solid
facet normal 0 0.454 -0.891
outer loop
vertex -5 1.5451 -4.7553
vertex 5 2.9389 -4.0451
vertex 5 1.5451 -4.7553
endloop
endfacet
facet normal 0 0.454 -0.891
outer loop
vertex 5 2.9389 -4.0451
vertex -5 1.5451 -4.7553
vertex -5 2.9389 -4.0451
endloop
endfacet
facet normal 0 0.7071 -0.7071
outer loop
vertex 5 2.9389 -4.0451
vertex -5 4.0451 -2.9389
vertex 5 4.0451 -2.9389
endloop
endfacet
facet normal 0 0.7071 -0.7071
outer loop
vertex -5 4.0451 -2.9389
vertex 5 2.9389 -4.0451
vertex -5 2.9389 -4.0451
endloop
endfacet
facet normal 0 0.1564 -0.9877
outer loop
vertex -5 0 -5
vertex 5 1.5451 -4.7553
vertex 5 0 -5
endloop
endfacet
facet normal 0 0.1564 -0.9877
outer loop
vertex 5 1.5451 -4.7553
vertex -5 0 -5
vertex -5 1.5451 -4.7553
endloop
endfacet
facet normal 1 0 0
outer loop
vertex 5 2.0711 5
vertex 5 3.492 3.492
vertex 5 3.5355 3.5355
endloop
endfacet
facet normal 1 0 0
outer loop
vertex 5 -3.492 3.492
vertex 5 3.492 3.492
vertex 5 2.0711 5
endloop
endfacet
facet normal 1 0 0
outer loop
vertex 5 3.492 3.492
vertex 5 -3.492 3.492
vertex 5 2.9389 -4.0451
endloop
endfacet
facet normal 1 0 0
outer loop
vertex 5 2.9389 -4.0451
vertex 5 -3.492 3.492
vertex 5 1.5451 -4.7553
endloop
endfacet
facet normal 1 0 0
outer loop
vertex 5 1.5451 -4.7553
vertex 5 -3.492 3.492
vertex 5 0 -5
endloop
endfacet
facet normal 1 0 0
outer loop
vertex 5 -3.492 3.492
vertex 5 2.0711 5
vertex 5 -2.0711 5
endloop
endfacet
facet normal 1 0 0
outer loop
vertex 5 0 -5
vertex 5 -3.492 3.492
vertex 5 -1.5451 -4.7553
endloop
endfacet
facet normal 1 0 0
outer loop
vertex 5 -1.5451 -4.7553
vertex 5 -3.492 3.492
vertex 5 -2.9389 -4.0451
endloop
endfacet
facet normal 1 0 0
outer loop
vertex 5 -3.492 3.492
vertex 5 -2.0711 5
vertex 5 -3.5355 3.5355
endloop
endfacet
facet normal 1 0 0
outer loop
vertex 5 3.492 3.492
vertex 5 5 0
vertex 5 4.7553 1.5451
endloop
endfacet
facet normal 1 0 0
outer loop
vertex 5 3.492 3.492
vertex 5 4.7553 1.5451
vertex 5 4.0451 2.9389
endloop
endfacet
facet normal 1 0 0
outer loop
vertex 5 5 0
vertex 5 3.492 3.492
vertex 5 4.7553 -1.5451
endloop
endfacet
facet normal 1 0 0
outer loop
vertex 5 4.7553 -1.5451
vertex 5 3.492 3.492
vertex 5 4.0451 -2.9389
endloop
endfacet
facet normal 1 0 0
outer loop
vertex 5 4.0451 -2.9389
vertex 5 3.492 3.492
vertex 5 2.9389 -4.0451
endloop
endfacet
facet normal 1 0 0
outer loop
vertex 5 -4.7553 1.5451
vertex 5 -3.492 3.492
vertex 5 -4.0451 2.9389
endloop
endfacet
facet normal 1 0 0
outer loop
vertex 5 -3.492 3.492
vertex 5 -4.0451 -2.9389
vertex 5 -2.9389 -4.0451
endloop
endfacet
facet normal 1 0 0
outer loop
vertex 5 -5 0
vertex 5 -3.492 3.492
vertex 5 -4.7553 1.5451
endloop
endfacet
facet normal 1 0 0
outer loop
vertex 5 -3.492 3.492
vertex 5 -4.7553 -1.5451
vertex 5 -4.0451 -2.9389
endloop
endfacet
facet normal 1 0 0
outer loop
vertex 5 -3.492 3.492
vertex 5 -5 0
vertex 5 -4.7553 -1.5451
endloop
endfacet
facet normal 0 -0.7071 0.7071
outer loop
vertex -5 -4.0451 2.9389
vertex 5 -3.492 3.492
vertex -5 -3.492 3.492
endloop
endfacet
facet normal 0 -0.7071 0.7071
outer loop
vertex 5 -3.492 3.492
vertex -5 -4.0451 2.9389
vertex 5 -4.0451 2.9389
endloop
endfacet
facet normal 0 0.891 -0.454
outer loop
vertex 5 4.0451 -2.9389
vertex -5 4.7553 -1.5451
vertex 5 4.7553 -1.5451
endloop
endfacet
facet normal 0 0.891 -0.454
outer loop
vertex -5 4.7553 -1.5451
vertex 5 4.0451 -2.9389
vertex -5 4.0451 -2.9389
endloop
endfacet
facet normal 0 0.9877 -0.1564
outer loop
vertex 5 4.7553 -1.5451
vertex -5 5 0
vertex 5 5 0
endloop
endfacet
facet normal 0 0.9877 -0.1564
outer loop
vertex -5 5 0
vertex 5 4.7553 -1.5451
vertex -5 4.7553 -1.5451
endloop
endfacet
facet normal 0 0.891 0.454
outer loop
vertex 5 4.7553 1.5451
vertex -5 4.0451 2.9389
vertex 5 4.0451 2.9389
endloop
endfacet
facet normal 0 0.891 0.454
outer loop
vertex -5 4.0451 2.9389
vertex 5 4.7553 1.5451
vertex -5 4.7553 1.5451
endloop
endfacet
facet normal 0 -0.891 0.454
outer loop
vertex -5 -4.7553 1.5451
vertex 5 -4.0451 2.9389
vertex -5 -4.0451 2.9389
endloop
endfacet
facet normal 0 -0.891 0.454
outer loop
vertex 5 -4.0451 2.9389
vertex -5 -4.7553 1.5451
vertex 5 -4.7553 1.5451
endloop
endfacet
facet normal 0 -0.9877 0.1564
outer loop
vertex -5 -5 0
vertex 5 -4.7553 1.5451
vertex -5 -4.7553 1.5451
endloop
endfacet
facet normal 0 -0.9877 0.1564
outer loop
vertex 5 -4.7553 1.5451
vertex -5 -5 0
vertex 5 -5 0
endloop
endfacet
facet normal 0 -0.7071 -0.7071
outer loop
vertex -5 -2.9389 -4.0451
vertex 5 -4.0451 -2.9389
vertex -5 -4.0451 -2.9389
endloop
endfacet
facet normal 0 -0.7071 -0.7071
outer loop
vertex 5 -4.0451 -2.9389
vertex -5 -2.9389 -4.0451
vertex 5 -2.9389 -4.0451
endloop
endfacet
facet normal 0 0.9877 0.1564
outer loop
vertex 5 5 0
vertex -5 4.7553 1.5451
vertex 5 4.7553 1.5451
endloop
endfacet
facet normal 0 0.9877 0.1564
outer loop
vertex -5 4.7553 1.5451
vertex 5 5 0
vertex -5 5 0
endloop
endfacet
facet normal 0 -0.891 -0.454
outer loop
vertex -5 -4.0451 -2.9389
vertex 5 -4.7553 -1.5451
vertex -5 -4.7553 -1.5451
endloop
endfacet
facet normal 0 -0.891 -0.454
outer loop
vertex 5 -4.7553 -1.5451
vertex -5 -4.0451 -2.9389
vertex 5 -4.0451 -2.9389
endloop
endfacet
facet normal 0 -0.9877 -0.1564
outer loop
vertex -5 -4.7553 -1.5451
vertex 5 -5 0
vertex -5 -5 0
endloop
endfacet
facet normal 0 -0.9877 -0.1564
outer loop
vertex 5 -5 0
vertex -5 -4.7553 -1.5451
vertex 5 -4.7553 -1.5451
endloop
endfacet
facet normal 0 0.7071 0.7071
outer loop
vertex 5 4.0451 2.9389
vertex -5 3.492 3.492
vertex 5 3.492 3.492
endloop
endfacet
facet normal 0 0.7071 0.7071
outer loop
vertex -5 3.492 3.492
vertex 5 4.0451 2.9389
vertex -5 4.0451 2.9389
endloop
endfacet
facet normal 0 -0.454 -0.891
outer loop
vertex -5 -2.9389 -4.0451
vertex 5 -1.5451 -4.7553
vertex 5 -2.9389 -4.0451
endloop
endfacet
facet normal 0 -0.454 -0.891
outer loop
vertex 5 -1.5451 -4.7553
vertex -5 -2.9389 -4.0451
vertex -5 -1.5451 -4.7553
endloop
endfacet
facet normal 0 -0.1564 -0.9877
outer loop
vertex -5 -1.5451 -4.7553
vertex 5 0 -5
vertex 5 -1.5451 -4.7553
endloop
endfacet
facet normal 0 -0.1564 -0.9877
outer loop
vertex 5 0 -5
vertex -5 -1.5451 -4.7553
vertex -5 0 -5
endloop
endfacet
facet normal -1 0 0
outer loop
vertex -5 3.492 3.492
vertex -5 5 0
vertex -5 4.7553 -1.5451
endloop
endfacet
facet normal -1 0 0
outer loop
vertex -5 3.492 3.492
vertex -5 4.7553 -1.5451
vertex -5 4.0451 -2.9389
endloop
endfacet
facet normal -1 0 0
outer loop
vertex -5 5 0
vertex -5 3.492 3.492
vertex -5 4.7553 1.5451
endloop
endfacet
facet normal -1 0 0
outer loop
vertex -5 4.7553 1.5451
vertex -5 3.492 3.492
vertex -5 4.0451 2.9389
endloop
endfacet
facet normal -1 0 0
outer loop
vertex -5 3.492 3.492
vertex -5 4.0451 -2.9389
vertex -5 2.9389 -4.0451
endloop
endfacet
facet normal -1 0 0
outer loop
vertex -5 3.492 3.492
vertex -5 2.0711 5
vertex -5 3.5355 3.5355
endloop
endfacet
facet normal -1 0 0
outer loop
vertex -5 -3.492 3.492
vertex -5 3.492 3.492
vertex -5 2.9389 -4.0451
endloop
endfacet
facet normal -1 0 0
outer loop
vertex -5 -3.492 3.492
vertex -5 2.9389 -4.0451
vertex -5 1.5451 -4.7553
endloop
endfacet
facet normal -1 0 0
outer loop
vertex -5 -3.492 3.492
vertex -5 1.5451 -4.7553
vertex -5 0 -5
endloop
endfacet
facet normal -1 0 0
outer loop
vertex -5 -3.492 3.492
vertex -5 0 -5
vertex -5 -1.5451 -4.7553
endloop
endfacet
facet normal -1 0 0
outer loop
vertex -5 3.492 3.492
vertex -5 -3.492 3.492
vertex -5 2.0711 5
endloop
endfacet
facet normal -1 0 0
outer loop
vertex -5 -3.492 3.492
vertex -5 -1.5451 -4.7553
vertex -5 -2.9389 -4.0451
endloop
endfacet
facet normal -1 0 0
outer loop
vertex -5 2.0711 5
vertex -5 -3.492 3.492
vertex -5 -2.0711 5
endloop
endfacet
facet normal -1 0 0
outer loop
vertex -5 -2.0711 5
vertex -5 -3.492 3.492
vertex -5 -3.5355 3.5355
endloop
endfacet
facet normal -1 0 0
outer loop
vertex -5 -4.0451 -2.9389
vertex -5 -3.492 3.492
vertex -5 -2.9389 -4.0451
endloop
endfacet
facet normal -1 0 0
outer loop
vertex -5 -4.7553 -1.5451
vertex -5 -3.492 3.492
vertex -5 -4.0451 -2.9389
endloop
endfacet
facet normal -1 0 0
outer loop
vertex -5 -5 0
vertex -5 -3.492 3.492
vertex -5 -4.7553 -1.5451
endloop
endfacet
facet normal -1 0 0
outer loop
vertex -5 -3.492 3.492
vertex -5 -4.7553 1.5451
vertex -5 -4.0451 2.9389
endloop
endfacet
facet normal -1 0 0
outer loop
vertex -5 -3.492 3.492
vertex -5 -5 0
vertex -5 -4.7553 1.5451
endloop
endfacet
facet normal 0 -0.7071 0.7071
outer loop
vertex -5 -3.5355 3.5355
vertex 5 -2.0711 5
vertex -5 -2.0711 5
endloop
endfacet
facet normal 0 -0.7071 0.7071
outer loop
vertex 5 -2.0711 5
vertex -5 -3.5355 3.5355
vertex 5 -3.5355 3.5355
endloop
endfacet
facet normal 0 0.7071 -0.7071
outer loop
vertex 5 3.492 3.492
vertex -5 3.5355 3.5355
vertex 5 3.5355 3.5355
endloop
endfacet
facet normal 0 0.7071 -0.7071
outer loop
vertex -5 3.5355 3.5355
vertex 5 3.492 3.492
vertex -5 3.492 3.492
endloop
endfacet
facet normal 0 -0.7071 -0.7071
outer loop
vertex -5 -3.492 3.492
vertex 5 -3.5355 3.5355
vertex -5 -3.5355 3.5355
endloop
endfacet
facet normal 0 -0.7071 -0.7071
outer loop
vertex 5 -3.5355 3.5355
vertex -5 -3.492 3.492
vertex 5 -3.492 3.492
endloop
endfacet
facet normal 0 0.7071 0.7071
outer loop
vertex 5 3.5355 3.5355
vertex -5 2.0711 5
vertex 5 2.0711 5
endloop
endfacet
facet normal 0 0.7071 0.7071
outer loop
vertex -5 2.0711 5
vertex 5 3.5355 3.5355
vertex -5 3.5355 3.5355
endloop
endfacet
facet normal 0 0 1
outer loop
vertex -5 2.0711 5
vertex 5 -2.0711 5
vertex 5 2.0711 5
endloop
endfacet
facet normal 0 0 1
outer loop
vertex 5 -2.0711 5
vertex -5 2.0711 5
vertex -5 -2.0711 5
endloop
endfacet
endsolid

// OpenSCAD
$fn = 20;

module screw_slot(width = 3, length = 10, depth = 10) {
  translate([(length - width) / 2, 0, 0])
    cylinder(d = width, h = depth, center = true);
  translate([- (length - width) / 2, 0, 0])
    cylinder(d = width, h = depth, center = true);
  cube([length - width, width, depth], center = true);
}

module smart_hole(d = 10, h = 10, center = true, bridging = true) {
    difference() {
        union() {
            rotate([0,90,0])
                cylinder(d = d, h = h, center = center);
            translate([0,0,sqrt(2*d*d)/4])
                rotate([45,0,0])
                cube([h,d/2,d/2], center = center);
        }
        if(bridging)
            translate([0,0,d])
                cube([h+1,d,d], center = center);
    }
}


smart_hole();
//screw_slot();
